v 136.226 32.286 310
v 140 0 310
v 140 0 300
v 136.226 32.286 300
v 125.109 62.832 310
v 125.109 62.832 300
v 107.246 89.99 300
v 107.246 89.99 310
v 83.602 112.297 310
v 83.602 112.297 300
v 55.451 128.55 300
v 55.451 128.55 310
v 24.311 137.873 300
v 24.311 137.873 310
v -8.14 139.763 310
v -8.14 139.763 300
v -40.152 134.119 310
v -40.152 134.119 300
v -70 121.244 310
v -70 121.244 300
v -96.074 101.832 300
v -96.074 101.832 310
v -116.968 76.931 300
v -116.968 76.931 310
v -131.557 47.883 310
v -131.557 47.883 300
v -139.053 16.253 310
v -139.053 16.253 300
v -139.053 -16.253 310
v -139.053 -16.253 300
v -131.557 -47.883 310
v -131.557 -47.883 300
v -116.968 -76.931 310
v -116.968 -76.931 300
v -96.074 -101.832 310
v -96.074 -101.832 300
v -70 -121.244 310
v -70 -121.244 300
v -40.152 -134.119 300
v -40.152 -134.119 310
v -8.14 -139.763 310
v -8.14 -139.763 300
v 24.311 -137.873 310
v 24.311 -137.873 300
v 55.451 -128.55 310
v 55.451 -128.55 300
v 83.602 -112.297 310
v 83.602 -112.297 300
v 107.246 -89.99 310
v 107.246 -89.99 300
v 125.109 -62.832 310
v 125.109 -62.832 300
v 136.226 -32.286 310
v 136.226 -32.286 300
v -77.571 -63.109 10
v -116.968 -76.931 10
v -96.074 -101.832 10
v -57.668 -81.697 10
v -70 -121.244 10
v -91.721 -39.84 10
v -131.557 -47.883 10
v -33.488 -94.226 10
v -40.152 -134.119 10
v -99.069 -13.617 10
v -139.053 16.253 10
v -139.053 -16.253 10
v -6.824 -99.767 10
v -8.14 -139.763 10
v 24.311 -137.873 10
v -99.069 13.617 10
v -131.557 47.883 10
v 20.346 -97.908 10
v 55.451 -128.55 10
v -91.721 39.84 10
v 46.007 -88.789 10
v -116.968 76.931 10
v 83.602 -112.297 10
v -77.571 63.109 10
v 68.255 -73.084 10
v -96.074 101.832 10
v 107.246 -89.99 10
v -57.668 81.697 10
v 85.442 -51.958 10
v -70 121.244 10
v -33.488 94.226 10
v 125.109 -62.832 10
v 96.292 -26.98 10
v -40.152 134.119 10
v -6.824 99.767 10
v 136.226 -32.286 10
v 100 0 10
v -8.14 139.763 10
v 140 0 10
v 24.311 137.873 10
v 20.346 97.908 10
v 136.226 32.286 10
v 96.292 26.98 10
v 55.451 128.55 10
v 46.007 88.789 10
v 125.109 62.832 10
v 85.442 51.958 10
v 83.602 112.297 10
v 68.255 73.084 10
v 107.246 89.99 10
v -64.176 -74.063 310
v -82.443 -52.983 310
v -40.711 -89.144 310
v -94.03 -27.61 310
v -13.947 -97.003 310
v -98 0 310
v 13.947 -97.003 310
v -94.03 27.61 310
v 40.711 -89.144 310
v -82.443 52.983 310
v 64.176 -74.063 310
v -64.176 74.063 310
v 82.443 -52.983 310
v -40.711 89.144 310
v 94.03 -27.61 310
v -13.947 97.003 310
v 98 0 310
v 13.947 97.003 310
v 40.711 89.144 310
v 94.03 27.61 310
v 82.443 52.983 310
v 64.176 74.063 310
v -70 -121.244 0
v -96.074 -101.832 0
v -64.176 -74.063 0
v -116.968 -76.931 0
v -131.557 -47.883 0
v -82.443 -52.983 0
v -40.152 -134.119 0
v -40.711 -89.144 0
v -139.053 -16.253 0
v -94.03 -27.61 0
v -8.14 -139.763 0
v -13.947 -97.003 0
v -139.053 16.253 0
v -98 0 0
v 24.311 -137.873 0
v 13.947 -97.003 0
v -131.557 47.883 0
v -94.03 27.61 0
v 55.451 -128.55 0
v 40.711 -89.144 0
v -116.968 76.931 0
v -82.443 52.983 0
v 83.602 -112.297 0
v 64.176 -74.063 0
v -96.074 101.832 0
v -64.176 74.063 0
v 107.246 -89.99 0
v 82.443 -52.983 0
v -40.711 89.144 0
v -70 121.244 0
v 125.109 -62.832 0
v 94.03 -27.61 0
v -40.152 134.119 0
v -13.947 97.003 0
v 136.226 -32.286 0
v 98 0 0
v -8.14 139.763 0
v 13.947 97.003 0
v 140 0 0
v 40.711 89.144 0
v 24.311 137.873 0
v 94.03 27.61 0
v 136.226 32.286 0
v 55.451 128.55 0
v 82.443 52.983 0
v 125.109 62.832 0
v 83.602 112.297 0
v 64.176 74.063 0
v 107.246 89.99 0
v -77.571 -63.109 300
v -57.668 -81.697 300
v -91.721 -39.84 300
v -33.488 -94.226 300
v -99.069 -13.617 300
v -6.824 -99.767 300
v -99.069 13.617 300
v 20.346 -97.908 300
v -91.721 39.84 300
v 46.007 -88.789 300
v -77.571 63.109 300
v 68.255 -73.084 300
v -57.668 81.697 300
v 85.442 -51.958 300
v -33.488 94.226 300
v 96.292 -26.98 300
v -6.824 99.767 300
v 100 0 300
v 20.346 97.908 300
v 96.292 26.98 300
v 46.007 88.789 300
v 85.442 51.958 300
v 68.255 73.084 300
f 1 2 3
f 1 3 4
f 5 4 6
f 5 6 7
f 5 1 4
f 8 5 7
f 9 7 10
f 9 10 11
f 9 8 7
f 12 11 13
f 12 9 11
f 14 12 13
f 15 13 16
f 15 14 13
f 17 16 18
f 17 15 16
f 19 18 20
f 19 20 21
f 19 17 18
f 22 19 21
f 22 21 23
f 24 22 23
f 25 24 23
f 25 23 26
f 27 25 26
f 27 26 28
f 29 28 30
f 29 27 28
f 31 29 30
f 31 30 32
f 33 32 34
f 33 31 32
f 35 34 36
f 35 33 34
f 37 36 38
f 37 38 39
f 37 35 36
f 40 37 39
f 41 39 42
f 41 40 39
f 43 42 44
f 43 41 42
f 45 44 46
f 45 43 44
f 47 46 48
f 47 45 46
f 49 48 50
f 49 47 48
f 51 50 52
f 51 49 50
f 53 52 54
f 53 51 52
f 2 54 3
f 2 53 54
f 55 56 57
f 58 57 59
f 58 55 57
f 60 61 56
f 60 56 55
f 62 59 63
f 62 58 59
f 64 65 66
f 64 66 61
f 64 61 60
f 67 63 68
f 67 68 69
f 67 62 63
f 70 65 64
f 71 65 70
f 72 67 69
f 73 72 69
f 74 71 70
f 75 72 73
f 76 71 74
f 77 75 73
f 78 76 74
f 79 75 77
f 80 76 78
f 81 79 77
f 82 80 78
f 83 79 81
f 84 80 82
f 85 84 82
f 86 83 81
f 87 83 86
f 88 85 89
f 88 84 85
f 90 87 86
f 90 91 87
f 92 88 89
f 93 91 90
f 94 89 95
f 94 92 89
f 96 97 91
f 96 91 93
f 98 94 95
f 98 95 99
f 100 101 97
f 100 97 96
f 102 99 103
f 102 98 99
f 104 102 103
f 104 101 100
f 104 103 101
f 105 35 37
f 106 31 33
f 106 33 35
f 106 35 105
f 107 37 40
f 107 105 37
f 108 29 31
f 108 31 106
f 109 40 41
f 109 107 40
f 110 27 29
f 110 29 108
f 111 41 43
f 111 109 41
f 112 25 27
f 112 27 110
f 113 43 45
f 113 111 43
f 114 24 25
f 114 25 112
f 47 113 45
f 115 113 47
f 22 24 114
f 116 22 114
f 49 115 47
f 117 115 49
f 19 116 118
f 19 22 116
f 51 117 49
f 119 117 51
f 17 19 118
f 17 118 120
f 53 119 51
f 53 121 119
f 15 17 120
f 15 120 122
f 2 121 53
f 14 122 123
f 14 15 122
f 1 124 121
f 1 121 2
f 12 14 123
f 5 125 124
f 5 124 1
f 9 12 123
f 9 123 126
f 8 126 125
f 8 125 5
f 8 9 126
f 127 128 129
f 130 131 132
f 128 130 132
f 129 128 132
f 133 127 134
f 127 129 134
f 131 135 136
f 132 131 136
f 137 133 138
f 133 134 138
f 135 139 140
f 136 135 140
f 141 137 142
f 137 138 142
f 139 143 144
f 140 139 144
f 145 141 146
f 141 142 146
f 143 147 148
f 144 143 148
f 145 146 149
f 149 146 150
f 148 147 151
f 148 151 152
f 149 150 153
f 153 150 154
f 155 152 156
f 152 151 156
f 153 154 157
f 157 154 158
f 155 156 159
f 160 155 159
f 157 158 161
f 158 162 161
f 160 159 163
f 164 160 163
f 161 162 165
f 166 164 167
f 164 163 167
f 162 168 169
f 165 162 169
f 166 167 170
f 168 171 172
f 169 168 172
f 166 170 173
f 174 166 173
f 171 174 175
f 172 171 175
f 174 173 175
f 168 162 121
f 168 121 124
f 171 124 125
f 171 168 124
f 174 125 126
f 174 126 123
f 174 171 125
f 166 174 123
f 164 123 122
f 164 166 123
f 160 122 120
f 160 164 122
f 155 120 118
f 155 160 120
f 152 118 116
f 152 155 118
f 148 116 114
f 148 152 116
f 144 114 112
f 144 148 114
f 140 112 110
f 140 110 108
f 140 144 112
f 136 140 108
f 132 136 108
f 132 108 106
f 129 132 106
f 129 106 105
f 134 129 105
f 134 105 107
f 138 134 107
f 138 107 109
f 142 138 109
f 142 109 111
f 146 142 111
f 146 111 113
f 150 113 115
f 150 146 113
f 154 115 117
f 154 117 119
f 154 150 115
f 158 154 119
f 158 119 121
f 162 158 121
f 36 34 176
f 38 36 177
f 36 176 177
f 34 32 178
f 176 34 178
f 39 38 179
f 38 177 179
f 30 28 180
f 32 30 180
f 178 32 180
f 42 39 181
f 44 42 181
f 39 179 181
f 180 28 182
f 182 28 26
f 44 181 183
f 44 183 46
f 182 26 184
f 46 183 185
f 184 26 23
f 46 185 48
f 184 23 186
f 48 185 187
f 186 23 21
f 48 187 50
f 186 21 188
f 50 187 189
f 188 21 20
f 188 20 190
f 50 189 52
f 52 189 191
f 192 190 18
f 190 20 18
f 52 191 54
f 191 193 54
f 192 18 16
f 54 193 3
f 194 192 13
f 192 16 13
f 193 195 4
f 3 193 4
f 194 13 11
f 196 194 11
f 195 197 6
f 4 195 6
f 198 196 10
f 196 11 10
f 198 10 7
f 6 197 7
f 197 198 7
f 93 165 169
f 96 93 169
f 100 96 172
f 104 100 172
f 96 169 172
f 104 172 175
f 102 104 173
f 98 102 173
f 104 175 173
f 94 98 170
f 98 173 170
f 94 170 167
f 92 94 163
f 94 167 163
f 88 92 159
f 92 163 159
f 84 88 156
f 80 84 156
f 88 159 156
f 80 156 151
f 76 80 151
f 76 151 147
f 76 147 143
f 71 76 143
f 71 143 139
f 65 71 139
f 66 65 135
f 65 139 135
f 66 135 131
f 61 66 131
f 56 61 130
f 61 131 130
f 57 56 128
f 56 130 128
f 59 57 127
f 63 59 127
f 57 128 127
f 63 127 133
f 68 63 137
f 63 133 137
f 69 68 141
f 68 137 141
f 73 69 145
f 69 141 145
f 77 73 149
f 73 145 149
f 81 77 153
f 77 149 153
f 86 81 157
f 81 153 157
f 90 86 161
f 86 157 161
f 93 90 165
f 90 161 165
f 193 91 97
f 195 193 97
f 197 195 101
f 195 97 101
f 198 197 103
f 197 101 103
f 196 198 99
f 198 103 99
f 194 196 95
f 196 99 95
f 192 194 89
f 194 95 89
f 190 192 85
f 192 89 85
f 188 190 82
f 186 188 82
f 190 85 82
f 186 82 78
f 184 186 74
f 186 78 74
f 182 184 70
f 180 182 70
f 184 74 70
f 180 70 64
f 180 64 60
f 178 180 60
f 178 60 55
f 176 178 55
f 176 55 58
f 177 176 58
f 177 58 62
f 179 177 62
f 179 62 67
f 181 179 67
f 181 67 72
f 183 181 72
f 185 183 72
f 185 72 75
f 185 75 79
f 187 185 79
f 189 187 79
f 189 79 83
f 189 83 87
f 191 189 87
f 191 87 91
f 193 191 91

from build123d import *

# Parameters (mm, degrees)
SKETCH2_R           = 100
SKETCH2_R_2         = 98
EXTRUDE_THIN1_DEPTH = 310
SKETCH3_R           = 140
SKETCH3_R_2         = 100
BOSS_EXTRUDE1_DEPTH = 10


with BuildPart() as part:
    # Sketch2 → Extrude-Thin1 (new body)
    with BuildSketch(Plane.XY):
        Circle(SKETCH2_R)
        Circle(SKETCH2_R_2, mode=Mode.SUBTRACT)
    extrude(amount=EXTRUDE_THIN1_DEPTH)

    # Sketch3 → Boss-Extrude1 (add)
    with BuildSketch(Plane.XY.offset(310)):
        Circle(SKETCH3_R)
        Circle(SKETCH3_R_2, mode=Mode.SUBTRACT)
    boss_extrude1 = extrude(amount=-BOSS_EXTRUDE1_DEPTH)

    # Mirror1: Boss-Extrude1 across plane
    add(boss_extrude1.mirror(Plane.XY.offset(155)))


solid = part.part
